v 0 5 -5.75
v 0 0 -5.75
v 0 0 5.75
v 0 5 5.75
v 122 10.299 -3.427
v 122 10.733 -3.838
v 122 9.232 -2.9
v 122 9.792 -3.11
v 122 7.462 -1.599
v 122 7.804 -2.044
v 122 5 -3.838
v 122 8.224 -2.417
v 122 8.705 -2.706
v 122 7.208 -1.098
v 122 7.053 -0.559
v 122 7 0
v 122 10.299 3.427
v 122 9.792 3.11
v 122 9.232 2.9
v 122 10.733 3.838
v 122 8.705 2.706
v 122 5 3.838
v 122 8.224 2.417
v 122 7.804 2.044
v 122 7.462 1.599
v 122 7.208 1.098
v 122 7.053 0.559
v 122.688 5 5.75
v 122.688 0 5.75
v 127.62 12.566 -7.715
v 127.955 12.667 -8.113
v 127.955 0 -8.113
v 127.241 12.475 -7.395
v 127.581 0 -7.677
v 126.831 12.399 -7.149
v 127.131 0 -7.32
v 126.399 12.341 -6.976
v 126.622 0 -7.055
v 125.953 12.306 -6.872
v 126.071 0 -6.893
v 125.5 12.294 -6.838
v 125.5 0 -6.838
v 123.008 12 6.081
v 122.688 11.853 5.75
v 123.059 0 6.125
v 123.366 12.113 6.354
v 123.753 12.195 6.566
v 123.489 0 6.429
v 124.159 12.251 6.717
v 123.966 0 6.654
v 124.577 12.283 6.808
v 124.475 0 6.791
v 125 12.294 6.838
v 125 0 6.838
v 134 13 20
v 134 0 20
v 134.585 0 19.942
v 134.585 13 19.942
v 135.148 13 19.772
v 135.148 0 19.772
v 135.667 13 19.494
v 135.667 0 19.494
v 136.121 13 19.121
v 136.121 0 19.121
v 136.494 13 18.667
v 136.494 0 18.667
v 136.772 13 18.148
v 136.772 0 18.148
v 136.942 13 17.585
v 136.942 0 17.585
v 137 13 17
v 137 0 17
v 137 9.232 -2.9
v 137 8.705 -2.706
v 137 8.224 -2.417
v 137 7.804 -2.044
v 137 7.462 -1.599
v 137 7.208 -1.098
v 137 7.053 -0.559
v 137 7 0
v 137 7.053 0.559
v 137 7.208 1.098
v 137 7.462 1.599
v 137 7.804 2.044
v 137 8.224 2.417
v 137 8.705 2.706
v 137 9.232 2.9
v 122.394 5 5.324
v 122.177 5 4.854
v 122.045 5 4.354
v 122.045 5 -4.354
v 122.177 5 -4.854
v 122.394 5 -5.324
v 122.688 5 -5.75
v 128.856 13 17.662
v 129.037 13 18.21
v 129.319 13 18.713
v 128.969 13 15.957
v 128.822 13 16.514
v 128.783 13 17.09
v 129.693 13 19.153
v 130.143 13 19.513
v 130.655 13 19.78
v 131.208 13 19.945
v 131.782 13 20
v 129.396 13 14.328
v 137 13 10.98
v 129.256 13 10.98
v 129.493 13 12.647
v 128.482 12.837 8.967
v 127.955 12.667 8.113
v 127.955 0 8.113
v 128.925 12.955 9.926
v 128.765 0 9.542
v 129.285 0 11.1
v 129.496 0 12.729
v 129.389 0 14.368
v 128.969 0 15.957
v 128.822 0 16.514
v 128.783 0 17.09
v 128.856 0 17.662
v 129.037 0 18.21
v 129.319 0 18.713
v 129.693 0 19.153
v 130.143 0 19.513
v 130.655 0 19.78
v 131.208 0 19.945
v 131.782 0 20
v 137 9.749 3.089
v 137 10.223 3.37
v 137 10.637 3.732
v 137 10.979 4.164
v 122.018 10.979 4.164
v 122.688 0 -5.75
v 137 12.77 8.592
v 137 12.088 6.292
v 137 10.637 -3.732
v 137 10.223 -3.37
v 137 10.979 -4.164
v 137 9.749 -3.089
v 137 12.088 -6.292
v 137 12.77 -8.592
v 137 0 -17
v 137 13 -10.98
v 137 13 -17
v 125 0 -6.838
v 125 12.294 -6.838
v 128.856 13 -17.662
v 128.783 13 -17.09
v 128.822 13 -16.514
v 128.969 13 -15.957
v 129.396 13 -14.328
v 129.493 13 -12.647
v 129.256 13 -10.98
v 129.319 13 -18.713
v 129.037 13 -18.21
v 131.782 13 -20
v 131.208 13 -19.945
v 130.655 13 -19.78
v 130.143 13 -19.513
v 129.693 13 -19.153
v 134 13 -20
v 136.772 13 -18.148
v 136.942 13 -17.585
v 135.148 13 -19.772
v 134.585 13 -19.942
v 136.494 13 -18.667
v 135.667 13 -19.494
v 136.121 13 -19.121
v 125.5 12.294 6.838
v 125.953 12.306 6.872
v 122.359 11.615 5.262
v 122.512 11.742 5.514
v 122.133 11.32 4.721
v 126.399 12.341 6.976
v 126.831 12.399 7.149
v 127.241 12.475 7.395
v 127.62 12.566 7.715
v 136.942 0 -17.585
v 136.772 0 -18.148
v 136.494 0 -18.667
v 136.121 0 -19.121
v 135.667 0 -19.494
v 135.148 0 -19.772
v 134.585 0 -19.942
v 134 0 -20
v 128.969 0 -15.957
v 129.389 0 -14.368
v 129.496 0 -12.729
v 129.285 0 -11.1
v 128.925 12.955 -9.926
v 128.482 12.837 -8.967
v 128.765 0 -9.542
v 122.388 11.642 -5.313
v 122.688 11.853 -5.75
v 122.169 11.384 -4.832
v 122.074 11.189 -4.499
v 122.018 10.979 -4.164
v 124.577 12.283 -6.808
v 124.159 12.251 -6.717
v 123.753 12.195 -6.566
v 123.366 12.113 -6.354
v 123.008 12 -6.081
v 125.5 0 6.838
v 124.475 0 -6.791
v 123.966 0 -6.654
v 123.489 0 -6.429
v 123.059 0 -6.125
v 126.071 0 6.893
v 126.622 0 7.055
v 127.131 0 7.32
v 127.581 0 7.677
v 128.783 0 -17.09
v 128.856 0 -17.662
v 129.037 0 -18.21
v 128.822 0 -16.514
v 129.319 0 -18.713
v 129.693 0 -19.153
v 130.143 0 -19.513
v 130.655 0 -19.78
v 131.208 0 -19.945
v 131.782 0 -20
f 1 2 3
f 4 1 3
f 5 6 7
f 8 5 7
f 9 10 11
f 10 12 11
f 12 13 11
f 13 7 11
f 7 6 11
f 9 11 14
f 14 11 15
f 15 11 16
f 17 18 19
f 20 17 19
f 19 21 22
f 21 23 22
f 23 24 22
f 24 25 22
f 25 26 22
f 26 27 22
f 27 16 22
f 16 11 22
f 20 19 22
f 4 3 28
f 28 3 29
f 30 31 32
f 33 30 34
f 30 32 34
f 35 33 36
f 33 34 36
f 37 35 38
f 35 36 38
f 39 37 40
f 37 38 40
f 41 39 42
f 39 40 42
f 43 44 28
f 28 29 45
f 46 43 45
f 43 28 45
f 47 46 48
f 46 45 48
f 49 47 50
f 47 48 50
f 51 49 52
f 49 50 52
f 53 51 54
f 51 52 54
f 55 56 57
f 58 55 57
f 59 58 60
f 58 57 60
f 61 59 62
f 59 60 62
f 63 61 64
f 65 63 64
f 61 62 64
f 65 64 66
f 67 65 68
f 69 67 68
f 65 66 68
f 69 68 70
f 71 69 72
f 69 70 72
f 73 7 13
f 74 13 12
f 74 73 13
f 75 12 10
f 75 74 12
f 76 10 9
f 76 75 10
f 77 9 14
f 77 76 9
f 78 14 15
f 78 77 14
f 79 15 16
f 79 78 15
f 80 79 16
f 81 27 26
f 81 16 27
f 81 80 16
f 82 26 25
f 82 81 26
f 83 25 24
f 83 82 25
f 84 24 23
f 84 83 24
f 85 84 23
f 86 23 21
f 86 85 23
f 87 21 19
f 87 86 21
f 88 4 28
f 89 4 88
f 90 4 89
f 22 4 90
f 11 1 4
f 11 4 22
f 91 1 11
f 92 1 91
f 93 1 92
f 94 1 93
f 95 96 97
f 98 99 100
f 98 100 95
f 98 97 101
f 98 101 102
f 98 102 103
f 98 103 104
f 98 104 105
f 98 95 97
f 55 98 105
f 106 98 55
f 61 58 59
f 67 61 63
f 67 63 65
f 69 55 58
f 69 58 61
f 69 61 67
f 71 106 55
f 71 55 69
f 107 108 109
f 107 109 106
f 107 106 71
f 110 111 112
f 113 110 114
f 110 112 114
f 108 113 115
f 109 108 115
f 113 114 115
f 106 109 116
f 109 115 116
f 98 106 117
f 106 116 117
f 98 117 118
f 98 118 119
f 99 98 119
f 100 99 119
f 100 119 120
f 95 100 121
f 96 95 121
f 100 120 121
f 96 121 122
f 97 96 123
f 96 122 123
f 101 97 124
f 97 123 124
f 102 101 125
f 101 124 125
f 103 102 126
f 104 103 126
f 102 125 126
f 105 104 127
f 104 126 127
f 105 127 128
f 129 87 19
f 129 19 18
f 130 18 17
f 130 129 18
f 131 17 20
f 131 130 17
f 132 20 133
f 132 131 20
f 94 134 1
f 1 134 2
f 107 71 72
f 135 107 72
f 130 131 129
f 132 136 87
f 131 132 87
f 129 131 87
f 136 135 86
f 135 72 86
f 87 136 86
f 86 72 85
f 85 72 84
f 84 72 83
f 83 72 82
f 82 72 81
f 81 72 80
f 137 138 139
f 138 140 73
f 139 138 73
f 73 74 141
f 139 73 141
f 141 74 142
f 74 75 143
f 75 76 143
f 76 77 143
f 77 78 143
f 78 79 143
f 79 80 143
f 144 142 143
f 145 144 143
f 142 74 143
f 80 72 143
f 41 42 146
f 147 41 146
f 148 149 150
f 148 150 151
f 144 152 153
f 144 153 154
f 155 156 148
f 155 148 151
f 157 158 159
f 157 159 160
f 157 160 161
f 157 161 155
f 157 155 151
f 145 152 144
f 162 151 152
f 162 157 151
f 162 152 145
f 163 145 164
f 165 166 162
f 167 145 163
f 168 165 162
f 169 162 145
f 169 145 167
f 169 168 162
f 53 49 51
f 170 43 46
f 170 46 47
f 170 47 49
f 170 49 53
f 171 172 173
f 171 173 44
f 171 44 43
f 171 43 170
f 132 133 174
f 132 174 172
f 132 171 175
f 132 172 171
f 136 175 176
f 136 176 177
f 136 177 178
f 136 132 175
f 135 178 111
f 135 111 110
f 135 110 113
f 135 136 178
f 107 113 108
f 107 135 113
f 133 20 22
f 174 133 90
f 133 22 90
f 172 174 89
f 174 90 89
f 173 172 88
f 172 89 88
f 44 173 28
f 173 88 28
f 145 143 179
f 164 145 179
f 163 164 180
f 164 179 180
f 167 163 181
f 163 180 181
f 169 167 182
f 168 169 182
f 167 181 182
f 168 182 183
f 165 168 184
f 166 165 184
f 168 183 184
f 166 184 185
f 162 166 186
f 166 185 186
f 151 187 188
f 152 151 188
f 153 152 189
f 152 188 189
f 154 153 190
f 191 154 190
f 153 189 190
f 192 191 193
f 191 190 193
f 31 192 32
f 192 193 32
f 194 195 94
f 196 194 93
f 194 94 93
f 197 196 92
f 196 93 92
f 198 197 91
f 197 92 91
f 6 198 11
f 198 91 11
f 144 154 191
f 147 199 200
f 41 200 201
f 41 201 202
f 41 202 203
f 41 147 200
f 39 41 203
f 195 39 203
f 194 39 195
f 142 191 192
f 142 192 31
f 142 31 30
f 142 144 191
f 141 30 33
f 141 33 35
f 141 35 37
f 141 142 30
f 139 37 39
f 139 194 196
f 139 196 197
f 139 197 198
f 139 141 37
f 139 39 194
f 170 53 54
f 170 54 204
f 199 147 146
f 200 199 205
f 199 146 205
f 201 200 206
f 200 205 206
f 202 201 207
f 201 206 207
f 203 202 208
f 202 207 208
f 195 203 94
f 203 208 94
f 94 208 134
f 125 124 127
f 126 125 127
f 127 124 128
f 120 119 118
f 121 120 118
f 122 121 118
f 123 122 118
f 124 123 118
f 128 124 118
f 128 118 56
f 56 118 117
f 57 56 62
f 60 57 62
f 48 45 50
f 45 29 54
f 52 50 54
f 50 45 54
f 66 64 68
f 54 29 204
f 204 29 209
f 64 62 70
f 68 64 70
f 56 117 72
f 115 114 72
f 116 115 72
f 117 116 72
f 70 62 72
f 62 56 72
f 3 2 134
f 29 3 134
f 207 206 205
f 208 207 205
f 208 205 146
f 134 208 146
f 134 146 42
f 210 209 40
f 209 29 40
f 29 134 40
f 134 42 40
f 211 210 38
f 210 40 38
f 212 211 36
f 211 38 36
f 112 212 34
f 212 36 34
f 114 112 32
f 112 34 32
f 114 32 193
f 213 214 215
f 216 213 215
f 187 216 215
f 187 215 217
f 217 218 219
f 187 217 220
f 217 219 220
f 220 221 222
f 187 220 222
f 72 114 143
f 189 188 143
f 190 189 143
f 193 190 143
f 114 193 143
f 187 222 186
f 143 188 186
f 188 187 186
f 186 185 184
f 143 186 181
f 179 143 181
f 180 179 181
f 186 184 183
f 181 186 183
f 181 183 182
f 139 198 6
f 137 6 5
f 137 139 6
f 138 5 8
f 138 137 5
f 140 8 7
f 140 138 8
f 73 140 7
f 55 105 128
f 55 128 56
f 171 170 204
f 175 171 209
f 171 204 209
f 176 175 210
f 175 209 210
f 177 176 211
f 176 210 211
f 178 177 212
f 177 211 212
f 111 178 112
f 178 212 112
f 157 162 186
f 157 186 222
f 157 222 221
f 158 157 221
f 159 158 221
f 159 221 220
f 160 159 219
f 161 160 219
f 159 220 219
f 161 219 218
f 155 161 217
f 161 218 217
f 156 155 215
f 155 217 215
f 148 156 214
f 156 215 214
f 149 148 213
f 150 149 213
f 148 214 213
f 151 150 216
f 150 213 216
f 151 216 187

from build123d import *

# Parameters (mm, degrees)
EXTRUDE_1_DEPTH     = 13
EXTRUDE_2_DEPTH     = 5
CUT_EXTRUDE_1_DEPTH = 140.061137634


with BuildPart() as part:
    # 草图1 → 凸台-拉伸1 (new body)
    with BuildSketch(Plane(origin=(0, 0, 0), x_dir=(1, 0, 0), z_dir=(0, 1, 0))):
        with BuildLine():
            Line((122, 3.83772234), (122, -3.83772234))
            ThreePointArc((122, -3.83772234), (122.878679656, -5.959042683), (125, -6.83772234))
            Line((125, -6.83772234), (125.5, -6.83772234))
            ThreePointArc((125.5, -6.83772234), (126.882997438, -7.175520603), (127.954545455, -8.112843616))
            ThreePointArc((127.954545455, -8.112843616), (129.429754152, -11.909474928), (128.969252111, -15.956521739))
            ThreePointArc((128.969252111, -15.956521739), (129.319163119, -18.713120722), (131.781929326, -20))
            Line((131.781929326, -20), (134, -20))
            ThreePointArc((134, -20), (136.121320344, -19.121320344), (137, -17))
            Line((137, -17), (137, 17))
            ThreePointArc((137, 17), (136.121320344, 19.121320344), (134, 20))
            Line((134, 20), (131.781929326, 20))
            ThreePointArc((131.781929326, 20), (129.319163119, 18.713120722), (128.969252111, 15.956521739))
            ThreePointArc((128.969252111, 15.956521739), (129.429754152, 11.909474928), (127.954545455, 8.112843616))
            ThreePointArc((127.954545455, 8.112843616), (126.882997438, 7.175520603), (125.5, 6.83772234))
            Line((125.5, 6.83772234), (125, 6.83772234))
            ThreePointArc((125, 6.83772234), (122.878679656, 5.959042683), (122, 3.83772234))
        make_face()
    extrude(amount=EXTRUDE_1_DEPTH)

    # 草图1<3> → 凸台-拉伸2 (add)
    with BuildSketch(Plane(origin=(0, 0, 0), x_dir=(1, 0, 0), z_dir=(0, 1, 0))):
        with BuildLine():
            Line((0, 5.75), (0, -5.75))
            Line((0, -5.75), (122.68846498, -5.75))
            ThreePointArc((122.68846498, -5.75), (122.177358944, -4.853939575), (122, -3.83772234))
            Line((122, -3.83772234), (122, 3.83772234))
            ThreePointArc((122, 3.83772234), (122.177358944, 4.853939575), (122.68846498, 5.75))
            Line((122.68846498, 5.75), (0, 5.75))
        make_face()
    extrude(amount=EXTRUDE_2_DEPTH)

    # 草图2 → 切除-拉伸1 (cut, through all)
    with BuildSketch(Plane(origin=(137, 0, 0), x_dir=(0, 0, -1), z_dir=(1, 0, 0))):
        with BuildLine():
            Line((-10.979609429, 13), (10.979609429, 13))
            ThreePointArc((10.979609429, 13), (7.425251062, 12.484011707), (4.164333864, 10.978645856))
            ThreePointArc((4.164333864, 10.978645856), (3.369802513, 10.222787671), (2.9, 9.231885425))
            ThreePointArc((2.9, 9.231885425), (0, 7), (-2.9, 9.231885425))
            ThreePointArc((-2.9, 9.231885425), (-3.369802513, 10.222787671), (-4.164333864, 10.978645856))
            ThreePointArc((-4.164333864, 10.978645856), (-7.425251062, 12.484011707), (-10.979609429, 13))
        make_face()
    extrude(amount=-CUT_EXTRUDE_1_DEPTH, mode=Mode.SUBTRACT)


solid = part.part
